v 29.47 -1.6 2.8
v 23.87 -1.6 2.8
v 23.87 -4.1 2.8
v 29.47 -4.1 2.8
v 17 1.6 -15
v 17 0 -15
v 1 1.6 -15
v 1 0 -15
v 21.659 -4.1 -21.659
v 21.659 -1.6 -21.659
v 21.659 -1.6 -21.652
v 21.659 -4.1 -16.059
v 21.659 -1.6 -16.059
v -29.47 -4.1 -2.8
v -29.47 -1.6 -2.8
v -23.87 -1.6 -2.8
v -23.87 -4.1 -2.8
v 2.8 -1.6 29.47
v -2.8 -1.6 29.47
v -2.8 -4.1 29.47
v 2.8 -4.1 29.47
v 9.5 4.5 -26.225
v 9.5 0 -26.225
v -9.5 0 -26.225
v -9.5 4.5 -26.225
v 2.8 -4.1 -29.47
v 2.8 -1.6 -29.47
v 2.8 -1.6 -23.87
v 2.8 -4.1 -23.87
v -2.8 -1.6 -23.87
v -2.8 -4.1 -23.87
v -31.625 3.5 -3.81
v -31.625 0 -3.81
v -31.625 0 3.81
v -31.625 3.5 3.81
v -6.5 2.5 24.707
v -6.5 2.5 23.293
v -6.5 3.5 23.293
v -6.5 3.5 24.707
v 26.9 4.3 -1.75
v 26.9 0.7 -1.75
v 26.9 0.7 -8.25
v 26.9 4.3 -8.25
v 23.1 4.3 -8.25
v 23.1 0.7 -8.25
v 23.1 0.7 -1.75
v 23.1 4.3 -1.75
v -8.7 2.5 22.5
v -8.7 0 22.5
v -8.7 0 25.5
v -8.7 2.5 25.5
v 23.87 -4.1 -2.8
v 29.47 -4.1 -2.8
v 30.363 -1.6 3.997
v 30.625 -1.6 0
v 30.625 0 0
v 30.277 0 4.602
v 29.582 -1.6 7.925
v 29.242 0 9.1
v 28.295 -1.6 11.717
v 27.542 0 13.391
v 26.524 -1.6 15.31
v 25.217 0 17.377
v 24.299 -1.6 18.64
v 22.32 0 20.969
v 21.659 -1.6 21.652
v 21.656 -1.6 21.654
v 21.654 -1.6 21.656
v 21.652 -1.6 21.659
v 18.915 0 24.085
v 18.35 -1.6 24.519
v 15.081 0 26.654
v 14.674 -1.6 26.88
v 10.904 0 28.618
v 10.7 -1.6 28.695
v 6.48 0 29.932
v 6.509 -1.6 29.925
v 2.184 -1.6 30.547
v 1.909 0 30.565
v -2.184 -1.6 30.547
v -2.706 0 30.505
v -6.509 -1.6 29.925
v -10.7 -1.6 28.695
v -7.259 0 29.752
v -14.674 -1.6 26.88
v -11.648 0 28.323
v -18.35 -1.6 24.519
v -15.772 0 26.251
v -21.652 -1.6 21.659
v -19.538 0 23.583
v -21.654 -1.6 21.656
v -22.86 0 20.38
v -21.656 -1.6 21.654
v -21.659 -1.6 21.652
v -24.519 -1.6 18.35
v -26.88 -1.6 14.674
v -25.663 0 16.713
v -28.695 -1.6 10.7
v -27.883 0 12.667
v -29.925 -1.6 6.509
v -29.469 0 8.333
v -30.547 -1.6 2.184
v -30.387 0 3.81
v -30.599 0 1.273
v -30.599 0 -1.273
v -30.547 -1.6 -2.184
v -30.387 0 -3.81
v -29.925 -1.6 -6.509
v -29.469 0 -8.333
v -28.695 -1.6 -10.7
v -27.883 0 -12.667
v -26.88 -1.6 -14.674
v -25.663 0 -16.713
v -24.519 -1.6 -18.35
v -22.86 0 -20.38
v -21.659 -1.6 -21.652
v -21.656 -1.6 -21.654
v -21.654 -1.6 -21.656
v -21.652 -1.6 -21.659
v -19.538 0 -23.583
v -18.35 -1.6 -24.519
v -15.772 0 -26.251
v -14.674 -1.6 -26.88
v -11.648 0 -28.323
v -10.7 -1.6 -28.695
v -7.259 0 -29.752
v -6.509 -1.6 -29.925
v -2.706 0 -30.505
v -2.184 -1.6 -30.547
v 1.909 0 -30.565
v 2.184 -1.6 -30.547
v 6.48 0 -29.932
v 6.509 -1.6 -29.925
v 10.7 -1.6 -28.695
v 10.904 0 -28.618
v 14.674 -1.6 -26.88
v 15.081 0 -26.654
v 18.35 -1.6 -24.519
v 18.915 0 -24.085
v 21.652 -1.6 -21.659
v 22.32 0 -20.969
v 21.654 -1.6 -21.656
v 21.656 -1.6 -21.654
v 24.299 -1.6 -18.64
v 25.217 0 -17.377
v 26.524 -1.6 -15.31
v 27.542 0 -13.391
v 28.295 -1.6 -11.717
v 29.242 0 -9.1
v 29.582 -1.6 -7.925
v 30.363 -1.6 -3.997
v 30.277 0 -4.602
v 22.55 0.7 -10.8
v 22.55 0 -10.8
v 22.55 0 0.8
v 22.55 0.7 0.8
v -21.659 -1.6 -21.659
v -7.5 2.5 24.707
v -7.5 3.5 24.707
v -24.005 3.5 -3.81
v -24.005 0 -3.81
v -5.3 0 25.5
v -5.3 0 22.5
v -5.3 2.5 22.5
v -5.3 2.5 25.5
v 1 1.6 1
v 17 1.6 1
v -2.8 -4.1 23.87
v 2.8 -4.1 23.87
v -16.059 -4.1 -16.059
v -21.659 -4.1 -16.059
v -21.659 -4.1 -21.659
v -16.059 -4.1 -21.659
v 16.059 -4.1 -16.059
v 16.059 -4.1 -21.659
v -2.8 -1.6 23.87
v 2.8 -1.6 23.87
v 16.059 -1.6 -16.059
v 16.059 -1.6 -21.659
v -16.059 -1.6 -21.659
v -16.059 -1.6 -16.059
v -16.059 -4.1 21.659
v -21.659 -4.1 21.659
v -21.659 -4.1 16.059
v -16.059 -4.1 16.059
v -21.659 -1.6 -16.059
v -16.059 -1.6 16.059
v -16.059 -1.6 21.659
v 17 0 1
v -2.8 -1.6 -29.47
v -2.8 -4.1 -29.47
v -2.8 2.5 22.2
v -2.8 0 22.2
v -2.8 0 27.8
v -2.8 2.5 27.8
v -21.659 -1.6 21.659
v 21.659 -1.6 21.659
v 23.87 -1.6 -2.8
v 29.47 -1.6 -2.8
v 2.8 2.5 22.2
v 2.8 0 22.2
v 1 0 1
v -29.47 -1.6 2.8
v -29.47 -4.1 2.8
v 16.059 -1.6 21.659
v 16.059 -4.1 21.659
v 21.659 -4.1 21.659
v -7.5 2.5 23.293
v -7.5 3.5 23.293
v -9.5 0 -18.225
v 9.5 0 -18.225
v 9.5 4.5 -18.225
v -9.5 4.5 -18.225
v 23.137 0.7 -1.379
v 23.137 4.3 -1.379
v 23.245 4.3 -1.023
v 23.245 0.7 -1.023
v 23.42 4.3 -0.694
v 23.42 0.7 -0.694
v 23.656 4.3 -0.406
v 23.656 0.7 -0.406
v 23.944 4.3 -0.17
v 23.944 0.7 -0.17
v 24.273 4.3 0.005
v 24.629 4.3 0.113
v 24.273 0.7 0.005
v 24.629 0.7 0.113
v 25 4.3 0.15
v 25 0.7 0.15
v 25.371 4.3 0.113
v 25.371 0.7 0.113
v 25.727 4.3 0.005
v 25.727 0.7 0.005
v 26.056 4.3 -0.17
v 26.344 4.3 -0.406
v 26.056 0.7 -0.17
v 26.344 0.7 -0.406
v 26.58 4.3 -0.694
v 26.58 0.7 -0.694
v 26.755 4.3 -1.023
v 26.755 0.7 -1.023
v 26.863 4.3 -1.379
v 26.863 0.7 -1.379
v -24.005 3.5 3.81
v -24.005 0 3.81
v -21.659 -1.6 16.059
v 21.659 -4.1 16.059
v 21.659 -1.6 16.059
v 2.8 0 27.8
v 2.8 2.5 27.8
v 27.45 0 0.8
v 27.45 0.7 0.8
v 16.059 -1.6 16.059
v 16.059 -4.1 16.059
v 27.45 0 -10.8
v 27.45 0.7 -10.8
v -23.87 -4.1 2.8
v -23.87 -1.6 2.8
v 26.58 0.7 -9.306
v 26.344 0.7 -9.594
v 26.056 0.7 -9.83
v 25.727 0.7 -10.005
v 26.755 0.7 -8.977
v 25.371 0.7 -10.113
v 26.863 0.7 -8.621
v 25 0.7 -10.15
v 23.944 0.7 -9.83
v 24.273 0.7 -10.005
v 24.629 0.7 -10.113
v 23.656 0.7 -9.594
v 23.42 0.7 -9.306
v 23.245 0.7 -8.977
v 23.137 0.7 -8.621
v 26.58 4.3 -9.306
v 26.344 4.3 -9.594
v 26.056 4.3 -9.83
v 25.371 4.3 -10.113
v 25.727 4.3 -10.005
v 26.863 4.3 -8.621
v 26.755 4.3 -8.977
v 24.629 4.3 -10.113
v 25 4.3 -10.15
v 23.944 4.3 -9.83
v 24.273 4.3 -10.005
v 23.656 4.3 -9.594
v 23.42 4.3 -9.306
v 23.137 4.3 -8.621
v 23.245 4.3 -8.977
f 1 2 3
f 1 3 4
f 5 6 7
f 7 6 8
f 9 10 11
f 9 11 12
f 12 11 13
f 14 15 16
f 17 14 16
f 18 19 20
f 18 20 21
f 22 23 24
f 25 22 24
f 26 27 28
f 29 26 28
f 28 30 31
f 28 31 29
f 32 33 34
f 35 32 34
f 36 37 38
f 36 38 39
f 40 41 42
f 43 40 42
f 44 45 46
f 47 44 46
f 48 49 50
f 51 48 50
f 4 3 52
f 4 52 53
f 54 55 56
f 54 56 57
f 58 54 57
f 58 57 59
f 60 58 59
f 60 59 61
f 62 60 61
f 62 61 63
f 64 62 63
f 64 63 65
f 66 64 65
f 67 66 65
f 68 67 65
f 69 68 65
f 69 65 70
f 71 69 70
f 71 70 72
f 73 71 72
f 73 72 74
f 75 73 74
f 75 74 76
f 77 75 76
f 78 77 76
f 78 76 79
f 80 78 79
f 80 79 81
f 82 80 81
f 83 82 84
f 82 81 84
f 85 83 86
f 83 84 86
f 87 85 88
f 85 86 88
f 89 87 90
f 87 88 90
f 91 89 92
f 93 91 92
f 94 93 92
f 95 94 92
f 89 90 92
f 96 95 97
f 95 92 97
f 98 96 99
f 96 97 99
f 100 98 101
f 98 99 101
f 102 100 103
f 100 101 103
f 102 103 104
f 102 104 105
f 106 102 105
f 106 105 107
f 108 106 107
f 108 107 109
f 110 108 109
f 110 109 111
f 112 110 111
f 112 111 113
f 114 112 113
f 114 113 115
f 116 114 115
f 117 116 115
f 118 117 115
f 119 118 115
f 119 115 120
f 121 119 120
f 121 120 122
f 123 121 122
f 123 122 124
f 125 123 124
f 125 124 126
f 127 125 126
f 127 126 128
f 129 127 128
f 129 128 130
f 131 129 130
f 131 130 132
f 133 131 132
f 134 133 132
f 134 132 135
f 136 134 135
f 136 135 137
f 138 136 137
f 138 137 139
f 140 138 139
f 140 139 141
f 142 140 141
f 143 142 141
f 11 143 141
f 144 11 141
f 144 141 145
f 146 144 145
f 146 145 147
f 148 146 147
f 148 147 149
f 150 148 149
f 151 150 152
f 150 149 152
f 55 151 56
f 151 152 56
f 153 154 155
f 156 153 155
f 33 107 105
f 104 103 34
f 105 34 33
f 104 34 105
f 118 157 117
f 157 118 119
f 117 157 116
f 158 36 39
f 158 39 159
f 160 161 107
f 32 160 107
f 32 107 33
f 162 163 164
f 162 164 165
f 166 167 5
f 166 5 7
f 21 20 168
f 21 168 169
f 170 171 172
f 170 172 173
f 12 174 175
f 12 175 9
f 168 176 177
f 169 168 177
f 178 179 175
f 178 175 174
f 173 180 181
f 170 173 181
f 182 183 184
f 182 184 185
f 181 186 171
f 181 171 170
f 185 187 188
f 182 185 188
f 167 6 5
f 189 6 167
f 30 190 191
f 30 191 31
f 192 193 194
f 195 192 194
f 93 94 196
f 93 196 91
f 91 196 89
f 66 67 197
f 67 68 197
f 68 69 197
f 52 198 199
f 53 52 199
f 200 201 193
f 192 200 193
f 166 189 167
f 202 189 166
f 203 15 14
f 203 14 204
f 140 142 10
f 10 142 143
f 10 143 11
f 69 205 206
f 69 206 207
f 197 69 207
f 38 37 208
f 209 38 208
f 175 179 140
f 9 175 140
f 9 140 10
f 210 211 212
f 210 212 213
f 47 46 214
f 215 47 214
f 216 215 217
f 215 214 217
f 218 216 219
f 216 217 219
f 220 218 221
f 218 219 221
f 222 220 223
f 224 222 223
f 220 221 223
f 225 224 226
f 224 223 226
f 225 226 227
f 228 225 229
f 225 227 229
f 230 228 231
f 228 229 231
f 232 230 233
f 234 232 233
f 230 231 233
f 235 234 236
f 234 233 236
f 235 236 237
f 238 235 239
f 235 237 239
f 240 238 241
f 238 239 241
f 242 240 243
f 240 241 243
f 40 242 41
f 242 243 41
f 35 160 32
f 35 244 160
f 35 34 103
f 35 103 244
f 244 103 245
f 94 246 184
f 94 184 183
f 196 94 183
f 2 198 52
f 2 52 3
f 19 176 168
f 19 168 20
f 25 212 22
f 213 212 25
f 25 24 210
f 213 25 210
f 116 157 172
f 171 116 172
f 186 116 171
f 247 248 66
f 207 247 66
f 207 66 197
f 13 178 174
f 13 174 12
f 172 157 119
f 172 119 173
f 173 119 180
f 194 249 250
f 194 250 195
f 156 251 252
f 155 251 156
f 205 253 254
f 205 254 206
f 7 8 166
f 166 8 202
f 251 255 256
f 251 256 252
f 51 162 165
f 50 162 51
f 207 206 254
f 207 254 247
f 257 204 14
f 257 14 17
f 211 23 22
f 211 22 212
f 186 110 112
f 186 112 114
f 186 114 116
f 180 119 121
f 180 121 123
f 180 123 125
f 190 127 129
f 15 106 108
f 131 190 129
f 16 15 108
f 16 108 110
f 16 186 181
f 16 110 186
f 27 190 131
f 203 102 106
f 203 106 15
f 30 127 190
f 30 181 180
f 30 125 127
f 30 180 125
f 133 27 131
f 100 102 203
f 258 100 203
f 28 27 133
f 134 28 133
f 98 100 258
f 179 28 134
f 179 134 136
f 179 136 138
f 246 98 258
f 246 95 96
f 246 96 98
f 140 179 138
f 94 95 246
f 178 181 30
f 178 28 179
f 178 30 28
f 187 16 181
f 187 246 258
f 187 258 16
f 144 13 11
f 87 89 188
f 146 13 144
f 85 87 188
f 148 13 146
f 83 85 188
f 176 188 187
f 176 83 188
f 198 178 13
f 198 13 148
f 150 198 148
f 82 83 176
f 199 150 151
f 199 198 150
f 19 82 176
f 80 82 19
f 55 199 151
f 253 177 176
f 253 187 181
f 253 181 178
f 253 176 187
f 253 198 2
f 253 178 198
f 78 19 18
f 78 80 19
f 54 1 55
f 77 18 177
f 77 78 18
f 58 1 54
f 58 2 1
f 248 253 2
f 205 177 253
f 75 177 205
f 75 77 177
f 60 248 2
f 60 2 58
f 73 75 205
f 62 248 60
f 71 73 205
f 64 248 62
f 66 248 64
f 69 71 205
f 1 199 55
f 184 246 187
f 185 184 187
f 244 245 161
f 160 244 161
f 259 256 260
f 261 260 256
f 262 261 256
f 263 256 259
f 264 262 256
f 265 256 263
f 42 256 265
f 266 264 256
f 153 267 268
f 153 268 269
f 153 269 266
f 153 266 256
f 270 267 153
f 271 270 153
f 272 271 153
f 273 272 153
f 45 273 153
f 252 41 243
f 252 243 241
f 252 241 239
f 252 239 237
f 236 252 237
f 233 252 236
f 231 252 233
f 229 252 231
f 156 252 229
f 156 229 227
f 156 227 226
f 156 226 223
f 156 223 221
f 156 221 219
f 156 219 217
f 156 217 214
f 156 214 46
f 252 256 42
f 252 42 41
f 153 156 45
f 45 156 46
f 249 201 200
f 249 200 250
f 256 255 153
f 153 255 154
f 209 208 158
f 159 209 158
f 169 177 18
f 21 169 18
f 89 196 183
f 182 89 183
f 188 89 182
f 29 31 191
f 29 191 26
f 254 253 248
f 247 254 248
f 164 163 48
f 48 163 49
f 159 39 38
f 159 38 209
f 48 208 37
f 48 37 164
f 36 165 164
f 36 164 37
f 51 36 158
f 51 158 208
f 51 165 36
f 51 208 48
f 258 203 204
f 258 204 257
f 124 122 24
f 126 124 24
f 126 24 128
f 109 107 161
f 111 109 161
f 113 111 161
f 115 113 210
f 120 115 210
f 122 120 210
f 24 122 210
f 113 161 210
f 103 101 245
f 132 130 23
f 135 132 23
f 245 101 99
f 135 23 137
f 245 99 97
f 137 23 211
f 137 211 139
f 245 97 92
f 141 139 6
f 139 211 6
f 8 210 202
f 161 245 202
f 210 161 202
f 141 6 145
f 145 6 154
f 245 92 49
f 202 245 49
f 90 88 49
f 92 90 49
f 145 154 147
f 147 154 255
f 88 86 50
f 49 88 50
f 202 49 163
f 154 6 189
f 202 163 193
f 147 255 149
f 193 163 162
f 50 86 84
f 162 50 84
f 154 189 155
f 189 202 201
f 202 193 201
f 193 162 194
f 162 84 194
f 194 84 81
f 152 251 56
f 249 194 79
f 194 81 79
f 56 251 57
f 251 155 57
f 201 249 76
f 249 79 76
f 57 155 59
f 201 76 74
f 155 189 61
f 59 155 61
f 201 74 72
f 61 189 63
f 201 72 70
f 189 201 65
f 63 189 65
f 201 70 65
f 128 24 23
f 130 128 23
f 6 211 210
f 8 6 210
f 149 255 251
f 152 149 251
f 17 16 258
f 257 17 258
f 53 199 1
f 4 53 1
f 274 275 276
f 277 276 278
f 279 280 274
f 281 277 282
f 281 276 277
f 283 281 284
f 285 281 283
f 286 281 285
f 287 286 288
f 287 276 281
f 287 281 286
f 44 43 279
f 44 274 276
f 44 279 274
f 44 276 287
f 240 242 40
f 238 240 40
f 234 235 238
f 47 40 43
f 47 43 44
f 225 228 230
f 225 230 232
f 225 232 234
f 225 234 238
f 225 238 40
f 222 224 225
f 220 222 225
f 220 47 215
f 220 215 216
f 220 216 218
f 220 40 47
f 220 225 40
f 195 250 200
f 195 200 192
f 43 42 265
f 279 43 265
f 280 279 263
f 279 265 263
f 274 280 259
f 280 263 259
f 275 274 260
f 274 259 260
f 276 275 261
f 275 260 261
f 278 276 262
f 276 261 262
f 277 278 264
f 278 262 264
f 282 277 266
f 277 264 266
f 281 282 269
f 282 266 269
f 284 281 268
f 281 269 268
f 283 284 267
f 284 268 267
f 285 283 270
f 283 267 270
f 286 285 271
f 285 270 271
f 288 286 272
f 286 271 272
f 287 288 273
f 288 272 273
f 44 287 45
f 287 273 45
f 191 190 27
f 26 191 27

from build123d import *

# Parameters (mm, degrees)
F0_R      = 30.625
F1_DEPTH  = 1.6
F2_W      = 5.6
F2_H      = 5.6
F3_DEPTH  = 2.5
F4_W      = 16
F4_H      = 16
F5_DEPTH  = 1.6
F4_W_2    = 5.6
F4_H_2    = 5.6
F6_DEPTH  = 2.5
F4_W_3    = 3.4
F4_H_3    = 3
F4_W_4    = 1
F4_H_4    = 1.4143656492
F7_DEPTH  = 2.5
F8_DEPTH  = 3.5
F4_W_5    = 19
F4_H_5    = 8
F10_DEPTH = 4.5
F4_W_6    = 4.9
F4_H_6    = 11.6
F11_DEPTH = 0.7
F12_DEPTH = 4.3
F13_DEPTH = 3.5


# Not quite as in the source:
# - the program builds the solid bodies; features that only make, move or delete a surface that nothing else refers to are left out


with BuildPart() as f1:
    # F0 (on Front) → F1 (new body)
    with BuildSketch(Plane.XZ):
        Circle(F0_R)
    extrude(amount=F1_DEPTH)

    # F2 (on face) → F3 (join)
    with BuildSketch(Plane.XZ.offset(1.6)):
        with Locations((-26.67, 0)):
            Rectangle(F2_W, F2_H)
        with Locations((-18.8585378542, 18.8585378542)):
            Rectangle(F2_W, F2_H)
        with Locations((0, 26.67)):
            Rectangle(F2_W, F2_H)
        with Locations((18.8585378542, 18.8585378542)):
            Rectangle(F2_W, F2_H)
        with Locations((26.67, 0)):
            Rectangle(F2_W, F2_H)
        with Locations((18.8585378542, -18.8585378542)):
            Rectangle(F2_W, F2_H)
        with Locations((0, -26.67)):
            Rectangle(F2_W, F2_H)
        with Locations((-18.8585378542, -18.8585378542)):
            Rectangle(F2_W, F2_H)
    extrude(amount=F3_DEPTH)

    # F4 (on face) → F5 (join)
    with BuildSketch(Plane(origin=(0, 0, 0), x_dir=(-1, 0, 0), z_dir=(0, 1, 0))):
        with Locations((-9, -7)):
            Rectangle(F4_W, F4_H)
    extrude(amount=F5_DEPTH)

    # F4 (on face) → F6 (join)
    with BuildSketch(Plane(origin=(0, 0, 0), x_dir=(-1, 0, 0), z_dir=(0, 1, 0))):
        with Locations((0, 25)):
            Rectangle(F4_W_2, F4_H_2)
    extrude(amount=F6_DEPTH)

    # F4 (on face) → F7 (join)
    with BuildSketch(Plane(origin=(0, 0, 0), x_dir=(-1, 0, 0), z_dir=(0, 1, 0))):
        with Locations((7, 24)):
            Rectangle(F4_W_3, F4_H_3)
        with Locations((7, 24)):
            Rectangle(F4_W_4, F4_H_4, mode=Mode.SUBTRACT)
    extrude(amount=F7_DEPTH)

    # F4 (on face) → F8 (join)
    with BuildSketch(Plane(origin=(0, 0, 0), x_dir=(-1, 0, 0), z_dir=(0, 1, 0))):
        with Locations((7, 24)):
            Rectangle(F4_W_4, F4_H_4)
    extrude(amount=F8_DEPTH)

    # F4 (on face) → F10 (join)
    with BuildSketch(Plane(origin=(0, 0, 0), x_dir=(-1, 0, 0), z_dir=(0, 1, 0))):
        with Locations((0, -22.225)):
            Rectangle(F4_W_5, F4_H_5)
    extrude(amount=F10_DEPTH)

    # F4 (on face) → F11 (join)
    with BuildSketch(Plane(origin=(0, 0, 0), x_dir=(-1, 0, 0), z_dir=(0, 1, 0))):
        with Locations((-25, -5)):
            Rectangle(F4_W_6, F4_H_6)
        with BuildLine():
            ThreePointArc((-26.9, -1.75), (-25, 0.15), (-23.1, -1.75))
            Line((-23.1, -1.75), (-23.1, -8.25))
            ThreePointArc((-23.1, -8.25), (-25, -10.15), (-26.9, -8.25))
            Line((-26.9, -8.25), (-26.9, -1.75))
        make_face(mode=Mode.SUBTRACT)
    extrude(amount=F11_DEPTH)

    # F4 (on face) → F12 (join)
    with BuildSketch(Plane(origin=(0, 0, 0), x_dir=(-1, 0, 0), z_dir=(0, 1, 0))):
        with BuildLine():
            Line((-23.1, -8.25), (-23.1, -1.75))
            ThreePointArc((-23.1, -1.75), (-25, 0.15), (-26.9, -1.75))
            Line((-26.9, -1.75), (-26.9, -8.25))
            ThreePointArc((-26.9, -8.25), (-25, -10.15), (-23.1, -8.25))
        make_face()
    extrude(amount=F12_DEPTH)

    # F4 (on face) → F13 (join)
    with BuildSketch(Plane(origin=(0, 0, 0), x_dir=(-1, 0, 0), z_dir=(0, 1, 0))):
        with BuildLine():
            Line((24.005, -3.81), (30.387078257, -3.81))
            ThreePointArc((30.387078257, -3.81), (30.5654616898, -1.90871074), (30.625, 0))
            ThreePointArc((30.625, 0), (30.5654616898, 1.90871074), (30.387078257, 3.81))
            Line((30.387078257, 3.81), (24.005, 3.81))
            Line((24.005, 3.81), (24.005, -3.81))
        make_face()
        with BuildLine():
            Line((30.387078257, -3.81), (31.625, -3.81))
            Line((31.625, -3.81), (31.625, 3.81))
            Line((31.625, 3.81), (30.387078257, 3.81))
            ThreePointArc((30.387078257, 3.81), (30.5654616898, 1.90871074), (30.625, 0))
            ThreePointArc((30.625, 0), (30.5654616898, -1.90871074), (30.387078257, -3.81))
        make_face()
    extrude(amount=F13_DEPTH)


solid = f1.part
